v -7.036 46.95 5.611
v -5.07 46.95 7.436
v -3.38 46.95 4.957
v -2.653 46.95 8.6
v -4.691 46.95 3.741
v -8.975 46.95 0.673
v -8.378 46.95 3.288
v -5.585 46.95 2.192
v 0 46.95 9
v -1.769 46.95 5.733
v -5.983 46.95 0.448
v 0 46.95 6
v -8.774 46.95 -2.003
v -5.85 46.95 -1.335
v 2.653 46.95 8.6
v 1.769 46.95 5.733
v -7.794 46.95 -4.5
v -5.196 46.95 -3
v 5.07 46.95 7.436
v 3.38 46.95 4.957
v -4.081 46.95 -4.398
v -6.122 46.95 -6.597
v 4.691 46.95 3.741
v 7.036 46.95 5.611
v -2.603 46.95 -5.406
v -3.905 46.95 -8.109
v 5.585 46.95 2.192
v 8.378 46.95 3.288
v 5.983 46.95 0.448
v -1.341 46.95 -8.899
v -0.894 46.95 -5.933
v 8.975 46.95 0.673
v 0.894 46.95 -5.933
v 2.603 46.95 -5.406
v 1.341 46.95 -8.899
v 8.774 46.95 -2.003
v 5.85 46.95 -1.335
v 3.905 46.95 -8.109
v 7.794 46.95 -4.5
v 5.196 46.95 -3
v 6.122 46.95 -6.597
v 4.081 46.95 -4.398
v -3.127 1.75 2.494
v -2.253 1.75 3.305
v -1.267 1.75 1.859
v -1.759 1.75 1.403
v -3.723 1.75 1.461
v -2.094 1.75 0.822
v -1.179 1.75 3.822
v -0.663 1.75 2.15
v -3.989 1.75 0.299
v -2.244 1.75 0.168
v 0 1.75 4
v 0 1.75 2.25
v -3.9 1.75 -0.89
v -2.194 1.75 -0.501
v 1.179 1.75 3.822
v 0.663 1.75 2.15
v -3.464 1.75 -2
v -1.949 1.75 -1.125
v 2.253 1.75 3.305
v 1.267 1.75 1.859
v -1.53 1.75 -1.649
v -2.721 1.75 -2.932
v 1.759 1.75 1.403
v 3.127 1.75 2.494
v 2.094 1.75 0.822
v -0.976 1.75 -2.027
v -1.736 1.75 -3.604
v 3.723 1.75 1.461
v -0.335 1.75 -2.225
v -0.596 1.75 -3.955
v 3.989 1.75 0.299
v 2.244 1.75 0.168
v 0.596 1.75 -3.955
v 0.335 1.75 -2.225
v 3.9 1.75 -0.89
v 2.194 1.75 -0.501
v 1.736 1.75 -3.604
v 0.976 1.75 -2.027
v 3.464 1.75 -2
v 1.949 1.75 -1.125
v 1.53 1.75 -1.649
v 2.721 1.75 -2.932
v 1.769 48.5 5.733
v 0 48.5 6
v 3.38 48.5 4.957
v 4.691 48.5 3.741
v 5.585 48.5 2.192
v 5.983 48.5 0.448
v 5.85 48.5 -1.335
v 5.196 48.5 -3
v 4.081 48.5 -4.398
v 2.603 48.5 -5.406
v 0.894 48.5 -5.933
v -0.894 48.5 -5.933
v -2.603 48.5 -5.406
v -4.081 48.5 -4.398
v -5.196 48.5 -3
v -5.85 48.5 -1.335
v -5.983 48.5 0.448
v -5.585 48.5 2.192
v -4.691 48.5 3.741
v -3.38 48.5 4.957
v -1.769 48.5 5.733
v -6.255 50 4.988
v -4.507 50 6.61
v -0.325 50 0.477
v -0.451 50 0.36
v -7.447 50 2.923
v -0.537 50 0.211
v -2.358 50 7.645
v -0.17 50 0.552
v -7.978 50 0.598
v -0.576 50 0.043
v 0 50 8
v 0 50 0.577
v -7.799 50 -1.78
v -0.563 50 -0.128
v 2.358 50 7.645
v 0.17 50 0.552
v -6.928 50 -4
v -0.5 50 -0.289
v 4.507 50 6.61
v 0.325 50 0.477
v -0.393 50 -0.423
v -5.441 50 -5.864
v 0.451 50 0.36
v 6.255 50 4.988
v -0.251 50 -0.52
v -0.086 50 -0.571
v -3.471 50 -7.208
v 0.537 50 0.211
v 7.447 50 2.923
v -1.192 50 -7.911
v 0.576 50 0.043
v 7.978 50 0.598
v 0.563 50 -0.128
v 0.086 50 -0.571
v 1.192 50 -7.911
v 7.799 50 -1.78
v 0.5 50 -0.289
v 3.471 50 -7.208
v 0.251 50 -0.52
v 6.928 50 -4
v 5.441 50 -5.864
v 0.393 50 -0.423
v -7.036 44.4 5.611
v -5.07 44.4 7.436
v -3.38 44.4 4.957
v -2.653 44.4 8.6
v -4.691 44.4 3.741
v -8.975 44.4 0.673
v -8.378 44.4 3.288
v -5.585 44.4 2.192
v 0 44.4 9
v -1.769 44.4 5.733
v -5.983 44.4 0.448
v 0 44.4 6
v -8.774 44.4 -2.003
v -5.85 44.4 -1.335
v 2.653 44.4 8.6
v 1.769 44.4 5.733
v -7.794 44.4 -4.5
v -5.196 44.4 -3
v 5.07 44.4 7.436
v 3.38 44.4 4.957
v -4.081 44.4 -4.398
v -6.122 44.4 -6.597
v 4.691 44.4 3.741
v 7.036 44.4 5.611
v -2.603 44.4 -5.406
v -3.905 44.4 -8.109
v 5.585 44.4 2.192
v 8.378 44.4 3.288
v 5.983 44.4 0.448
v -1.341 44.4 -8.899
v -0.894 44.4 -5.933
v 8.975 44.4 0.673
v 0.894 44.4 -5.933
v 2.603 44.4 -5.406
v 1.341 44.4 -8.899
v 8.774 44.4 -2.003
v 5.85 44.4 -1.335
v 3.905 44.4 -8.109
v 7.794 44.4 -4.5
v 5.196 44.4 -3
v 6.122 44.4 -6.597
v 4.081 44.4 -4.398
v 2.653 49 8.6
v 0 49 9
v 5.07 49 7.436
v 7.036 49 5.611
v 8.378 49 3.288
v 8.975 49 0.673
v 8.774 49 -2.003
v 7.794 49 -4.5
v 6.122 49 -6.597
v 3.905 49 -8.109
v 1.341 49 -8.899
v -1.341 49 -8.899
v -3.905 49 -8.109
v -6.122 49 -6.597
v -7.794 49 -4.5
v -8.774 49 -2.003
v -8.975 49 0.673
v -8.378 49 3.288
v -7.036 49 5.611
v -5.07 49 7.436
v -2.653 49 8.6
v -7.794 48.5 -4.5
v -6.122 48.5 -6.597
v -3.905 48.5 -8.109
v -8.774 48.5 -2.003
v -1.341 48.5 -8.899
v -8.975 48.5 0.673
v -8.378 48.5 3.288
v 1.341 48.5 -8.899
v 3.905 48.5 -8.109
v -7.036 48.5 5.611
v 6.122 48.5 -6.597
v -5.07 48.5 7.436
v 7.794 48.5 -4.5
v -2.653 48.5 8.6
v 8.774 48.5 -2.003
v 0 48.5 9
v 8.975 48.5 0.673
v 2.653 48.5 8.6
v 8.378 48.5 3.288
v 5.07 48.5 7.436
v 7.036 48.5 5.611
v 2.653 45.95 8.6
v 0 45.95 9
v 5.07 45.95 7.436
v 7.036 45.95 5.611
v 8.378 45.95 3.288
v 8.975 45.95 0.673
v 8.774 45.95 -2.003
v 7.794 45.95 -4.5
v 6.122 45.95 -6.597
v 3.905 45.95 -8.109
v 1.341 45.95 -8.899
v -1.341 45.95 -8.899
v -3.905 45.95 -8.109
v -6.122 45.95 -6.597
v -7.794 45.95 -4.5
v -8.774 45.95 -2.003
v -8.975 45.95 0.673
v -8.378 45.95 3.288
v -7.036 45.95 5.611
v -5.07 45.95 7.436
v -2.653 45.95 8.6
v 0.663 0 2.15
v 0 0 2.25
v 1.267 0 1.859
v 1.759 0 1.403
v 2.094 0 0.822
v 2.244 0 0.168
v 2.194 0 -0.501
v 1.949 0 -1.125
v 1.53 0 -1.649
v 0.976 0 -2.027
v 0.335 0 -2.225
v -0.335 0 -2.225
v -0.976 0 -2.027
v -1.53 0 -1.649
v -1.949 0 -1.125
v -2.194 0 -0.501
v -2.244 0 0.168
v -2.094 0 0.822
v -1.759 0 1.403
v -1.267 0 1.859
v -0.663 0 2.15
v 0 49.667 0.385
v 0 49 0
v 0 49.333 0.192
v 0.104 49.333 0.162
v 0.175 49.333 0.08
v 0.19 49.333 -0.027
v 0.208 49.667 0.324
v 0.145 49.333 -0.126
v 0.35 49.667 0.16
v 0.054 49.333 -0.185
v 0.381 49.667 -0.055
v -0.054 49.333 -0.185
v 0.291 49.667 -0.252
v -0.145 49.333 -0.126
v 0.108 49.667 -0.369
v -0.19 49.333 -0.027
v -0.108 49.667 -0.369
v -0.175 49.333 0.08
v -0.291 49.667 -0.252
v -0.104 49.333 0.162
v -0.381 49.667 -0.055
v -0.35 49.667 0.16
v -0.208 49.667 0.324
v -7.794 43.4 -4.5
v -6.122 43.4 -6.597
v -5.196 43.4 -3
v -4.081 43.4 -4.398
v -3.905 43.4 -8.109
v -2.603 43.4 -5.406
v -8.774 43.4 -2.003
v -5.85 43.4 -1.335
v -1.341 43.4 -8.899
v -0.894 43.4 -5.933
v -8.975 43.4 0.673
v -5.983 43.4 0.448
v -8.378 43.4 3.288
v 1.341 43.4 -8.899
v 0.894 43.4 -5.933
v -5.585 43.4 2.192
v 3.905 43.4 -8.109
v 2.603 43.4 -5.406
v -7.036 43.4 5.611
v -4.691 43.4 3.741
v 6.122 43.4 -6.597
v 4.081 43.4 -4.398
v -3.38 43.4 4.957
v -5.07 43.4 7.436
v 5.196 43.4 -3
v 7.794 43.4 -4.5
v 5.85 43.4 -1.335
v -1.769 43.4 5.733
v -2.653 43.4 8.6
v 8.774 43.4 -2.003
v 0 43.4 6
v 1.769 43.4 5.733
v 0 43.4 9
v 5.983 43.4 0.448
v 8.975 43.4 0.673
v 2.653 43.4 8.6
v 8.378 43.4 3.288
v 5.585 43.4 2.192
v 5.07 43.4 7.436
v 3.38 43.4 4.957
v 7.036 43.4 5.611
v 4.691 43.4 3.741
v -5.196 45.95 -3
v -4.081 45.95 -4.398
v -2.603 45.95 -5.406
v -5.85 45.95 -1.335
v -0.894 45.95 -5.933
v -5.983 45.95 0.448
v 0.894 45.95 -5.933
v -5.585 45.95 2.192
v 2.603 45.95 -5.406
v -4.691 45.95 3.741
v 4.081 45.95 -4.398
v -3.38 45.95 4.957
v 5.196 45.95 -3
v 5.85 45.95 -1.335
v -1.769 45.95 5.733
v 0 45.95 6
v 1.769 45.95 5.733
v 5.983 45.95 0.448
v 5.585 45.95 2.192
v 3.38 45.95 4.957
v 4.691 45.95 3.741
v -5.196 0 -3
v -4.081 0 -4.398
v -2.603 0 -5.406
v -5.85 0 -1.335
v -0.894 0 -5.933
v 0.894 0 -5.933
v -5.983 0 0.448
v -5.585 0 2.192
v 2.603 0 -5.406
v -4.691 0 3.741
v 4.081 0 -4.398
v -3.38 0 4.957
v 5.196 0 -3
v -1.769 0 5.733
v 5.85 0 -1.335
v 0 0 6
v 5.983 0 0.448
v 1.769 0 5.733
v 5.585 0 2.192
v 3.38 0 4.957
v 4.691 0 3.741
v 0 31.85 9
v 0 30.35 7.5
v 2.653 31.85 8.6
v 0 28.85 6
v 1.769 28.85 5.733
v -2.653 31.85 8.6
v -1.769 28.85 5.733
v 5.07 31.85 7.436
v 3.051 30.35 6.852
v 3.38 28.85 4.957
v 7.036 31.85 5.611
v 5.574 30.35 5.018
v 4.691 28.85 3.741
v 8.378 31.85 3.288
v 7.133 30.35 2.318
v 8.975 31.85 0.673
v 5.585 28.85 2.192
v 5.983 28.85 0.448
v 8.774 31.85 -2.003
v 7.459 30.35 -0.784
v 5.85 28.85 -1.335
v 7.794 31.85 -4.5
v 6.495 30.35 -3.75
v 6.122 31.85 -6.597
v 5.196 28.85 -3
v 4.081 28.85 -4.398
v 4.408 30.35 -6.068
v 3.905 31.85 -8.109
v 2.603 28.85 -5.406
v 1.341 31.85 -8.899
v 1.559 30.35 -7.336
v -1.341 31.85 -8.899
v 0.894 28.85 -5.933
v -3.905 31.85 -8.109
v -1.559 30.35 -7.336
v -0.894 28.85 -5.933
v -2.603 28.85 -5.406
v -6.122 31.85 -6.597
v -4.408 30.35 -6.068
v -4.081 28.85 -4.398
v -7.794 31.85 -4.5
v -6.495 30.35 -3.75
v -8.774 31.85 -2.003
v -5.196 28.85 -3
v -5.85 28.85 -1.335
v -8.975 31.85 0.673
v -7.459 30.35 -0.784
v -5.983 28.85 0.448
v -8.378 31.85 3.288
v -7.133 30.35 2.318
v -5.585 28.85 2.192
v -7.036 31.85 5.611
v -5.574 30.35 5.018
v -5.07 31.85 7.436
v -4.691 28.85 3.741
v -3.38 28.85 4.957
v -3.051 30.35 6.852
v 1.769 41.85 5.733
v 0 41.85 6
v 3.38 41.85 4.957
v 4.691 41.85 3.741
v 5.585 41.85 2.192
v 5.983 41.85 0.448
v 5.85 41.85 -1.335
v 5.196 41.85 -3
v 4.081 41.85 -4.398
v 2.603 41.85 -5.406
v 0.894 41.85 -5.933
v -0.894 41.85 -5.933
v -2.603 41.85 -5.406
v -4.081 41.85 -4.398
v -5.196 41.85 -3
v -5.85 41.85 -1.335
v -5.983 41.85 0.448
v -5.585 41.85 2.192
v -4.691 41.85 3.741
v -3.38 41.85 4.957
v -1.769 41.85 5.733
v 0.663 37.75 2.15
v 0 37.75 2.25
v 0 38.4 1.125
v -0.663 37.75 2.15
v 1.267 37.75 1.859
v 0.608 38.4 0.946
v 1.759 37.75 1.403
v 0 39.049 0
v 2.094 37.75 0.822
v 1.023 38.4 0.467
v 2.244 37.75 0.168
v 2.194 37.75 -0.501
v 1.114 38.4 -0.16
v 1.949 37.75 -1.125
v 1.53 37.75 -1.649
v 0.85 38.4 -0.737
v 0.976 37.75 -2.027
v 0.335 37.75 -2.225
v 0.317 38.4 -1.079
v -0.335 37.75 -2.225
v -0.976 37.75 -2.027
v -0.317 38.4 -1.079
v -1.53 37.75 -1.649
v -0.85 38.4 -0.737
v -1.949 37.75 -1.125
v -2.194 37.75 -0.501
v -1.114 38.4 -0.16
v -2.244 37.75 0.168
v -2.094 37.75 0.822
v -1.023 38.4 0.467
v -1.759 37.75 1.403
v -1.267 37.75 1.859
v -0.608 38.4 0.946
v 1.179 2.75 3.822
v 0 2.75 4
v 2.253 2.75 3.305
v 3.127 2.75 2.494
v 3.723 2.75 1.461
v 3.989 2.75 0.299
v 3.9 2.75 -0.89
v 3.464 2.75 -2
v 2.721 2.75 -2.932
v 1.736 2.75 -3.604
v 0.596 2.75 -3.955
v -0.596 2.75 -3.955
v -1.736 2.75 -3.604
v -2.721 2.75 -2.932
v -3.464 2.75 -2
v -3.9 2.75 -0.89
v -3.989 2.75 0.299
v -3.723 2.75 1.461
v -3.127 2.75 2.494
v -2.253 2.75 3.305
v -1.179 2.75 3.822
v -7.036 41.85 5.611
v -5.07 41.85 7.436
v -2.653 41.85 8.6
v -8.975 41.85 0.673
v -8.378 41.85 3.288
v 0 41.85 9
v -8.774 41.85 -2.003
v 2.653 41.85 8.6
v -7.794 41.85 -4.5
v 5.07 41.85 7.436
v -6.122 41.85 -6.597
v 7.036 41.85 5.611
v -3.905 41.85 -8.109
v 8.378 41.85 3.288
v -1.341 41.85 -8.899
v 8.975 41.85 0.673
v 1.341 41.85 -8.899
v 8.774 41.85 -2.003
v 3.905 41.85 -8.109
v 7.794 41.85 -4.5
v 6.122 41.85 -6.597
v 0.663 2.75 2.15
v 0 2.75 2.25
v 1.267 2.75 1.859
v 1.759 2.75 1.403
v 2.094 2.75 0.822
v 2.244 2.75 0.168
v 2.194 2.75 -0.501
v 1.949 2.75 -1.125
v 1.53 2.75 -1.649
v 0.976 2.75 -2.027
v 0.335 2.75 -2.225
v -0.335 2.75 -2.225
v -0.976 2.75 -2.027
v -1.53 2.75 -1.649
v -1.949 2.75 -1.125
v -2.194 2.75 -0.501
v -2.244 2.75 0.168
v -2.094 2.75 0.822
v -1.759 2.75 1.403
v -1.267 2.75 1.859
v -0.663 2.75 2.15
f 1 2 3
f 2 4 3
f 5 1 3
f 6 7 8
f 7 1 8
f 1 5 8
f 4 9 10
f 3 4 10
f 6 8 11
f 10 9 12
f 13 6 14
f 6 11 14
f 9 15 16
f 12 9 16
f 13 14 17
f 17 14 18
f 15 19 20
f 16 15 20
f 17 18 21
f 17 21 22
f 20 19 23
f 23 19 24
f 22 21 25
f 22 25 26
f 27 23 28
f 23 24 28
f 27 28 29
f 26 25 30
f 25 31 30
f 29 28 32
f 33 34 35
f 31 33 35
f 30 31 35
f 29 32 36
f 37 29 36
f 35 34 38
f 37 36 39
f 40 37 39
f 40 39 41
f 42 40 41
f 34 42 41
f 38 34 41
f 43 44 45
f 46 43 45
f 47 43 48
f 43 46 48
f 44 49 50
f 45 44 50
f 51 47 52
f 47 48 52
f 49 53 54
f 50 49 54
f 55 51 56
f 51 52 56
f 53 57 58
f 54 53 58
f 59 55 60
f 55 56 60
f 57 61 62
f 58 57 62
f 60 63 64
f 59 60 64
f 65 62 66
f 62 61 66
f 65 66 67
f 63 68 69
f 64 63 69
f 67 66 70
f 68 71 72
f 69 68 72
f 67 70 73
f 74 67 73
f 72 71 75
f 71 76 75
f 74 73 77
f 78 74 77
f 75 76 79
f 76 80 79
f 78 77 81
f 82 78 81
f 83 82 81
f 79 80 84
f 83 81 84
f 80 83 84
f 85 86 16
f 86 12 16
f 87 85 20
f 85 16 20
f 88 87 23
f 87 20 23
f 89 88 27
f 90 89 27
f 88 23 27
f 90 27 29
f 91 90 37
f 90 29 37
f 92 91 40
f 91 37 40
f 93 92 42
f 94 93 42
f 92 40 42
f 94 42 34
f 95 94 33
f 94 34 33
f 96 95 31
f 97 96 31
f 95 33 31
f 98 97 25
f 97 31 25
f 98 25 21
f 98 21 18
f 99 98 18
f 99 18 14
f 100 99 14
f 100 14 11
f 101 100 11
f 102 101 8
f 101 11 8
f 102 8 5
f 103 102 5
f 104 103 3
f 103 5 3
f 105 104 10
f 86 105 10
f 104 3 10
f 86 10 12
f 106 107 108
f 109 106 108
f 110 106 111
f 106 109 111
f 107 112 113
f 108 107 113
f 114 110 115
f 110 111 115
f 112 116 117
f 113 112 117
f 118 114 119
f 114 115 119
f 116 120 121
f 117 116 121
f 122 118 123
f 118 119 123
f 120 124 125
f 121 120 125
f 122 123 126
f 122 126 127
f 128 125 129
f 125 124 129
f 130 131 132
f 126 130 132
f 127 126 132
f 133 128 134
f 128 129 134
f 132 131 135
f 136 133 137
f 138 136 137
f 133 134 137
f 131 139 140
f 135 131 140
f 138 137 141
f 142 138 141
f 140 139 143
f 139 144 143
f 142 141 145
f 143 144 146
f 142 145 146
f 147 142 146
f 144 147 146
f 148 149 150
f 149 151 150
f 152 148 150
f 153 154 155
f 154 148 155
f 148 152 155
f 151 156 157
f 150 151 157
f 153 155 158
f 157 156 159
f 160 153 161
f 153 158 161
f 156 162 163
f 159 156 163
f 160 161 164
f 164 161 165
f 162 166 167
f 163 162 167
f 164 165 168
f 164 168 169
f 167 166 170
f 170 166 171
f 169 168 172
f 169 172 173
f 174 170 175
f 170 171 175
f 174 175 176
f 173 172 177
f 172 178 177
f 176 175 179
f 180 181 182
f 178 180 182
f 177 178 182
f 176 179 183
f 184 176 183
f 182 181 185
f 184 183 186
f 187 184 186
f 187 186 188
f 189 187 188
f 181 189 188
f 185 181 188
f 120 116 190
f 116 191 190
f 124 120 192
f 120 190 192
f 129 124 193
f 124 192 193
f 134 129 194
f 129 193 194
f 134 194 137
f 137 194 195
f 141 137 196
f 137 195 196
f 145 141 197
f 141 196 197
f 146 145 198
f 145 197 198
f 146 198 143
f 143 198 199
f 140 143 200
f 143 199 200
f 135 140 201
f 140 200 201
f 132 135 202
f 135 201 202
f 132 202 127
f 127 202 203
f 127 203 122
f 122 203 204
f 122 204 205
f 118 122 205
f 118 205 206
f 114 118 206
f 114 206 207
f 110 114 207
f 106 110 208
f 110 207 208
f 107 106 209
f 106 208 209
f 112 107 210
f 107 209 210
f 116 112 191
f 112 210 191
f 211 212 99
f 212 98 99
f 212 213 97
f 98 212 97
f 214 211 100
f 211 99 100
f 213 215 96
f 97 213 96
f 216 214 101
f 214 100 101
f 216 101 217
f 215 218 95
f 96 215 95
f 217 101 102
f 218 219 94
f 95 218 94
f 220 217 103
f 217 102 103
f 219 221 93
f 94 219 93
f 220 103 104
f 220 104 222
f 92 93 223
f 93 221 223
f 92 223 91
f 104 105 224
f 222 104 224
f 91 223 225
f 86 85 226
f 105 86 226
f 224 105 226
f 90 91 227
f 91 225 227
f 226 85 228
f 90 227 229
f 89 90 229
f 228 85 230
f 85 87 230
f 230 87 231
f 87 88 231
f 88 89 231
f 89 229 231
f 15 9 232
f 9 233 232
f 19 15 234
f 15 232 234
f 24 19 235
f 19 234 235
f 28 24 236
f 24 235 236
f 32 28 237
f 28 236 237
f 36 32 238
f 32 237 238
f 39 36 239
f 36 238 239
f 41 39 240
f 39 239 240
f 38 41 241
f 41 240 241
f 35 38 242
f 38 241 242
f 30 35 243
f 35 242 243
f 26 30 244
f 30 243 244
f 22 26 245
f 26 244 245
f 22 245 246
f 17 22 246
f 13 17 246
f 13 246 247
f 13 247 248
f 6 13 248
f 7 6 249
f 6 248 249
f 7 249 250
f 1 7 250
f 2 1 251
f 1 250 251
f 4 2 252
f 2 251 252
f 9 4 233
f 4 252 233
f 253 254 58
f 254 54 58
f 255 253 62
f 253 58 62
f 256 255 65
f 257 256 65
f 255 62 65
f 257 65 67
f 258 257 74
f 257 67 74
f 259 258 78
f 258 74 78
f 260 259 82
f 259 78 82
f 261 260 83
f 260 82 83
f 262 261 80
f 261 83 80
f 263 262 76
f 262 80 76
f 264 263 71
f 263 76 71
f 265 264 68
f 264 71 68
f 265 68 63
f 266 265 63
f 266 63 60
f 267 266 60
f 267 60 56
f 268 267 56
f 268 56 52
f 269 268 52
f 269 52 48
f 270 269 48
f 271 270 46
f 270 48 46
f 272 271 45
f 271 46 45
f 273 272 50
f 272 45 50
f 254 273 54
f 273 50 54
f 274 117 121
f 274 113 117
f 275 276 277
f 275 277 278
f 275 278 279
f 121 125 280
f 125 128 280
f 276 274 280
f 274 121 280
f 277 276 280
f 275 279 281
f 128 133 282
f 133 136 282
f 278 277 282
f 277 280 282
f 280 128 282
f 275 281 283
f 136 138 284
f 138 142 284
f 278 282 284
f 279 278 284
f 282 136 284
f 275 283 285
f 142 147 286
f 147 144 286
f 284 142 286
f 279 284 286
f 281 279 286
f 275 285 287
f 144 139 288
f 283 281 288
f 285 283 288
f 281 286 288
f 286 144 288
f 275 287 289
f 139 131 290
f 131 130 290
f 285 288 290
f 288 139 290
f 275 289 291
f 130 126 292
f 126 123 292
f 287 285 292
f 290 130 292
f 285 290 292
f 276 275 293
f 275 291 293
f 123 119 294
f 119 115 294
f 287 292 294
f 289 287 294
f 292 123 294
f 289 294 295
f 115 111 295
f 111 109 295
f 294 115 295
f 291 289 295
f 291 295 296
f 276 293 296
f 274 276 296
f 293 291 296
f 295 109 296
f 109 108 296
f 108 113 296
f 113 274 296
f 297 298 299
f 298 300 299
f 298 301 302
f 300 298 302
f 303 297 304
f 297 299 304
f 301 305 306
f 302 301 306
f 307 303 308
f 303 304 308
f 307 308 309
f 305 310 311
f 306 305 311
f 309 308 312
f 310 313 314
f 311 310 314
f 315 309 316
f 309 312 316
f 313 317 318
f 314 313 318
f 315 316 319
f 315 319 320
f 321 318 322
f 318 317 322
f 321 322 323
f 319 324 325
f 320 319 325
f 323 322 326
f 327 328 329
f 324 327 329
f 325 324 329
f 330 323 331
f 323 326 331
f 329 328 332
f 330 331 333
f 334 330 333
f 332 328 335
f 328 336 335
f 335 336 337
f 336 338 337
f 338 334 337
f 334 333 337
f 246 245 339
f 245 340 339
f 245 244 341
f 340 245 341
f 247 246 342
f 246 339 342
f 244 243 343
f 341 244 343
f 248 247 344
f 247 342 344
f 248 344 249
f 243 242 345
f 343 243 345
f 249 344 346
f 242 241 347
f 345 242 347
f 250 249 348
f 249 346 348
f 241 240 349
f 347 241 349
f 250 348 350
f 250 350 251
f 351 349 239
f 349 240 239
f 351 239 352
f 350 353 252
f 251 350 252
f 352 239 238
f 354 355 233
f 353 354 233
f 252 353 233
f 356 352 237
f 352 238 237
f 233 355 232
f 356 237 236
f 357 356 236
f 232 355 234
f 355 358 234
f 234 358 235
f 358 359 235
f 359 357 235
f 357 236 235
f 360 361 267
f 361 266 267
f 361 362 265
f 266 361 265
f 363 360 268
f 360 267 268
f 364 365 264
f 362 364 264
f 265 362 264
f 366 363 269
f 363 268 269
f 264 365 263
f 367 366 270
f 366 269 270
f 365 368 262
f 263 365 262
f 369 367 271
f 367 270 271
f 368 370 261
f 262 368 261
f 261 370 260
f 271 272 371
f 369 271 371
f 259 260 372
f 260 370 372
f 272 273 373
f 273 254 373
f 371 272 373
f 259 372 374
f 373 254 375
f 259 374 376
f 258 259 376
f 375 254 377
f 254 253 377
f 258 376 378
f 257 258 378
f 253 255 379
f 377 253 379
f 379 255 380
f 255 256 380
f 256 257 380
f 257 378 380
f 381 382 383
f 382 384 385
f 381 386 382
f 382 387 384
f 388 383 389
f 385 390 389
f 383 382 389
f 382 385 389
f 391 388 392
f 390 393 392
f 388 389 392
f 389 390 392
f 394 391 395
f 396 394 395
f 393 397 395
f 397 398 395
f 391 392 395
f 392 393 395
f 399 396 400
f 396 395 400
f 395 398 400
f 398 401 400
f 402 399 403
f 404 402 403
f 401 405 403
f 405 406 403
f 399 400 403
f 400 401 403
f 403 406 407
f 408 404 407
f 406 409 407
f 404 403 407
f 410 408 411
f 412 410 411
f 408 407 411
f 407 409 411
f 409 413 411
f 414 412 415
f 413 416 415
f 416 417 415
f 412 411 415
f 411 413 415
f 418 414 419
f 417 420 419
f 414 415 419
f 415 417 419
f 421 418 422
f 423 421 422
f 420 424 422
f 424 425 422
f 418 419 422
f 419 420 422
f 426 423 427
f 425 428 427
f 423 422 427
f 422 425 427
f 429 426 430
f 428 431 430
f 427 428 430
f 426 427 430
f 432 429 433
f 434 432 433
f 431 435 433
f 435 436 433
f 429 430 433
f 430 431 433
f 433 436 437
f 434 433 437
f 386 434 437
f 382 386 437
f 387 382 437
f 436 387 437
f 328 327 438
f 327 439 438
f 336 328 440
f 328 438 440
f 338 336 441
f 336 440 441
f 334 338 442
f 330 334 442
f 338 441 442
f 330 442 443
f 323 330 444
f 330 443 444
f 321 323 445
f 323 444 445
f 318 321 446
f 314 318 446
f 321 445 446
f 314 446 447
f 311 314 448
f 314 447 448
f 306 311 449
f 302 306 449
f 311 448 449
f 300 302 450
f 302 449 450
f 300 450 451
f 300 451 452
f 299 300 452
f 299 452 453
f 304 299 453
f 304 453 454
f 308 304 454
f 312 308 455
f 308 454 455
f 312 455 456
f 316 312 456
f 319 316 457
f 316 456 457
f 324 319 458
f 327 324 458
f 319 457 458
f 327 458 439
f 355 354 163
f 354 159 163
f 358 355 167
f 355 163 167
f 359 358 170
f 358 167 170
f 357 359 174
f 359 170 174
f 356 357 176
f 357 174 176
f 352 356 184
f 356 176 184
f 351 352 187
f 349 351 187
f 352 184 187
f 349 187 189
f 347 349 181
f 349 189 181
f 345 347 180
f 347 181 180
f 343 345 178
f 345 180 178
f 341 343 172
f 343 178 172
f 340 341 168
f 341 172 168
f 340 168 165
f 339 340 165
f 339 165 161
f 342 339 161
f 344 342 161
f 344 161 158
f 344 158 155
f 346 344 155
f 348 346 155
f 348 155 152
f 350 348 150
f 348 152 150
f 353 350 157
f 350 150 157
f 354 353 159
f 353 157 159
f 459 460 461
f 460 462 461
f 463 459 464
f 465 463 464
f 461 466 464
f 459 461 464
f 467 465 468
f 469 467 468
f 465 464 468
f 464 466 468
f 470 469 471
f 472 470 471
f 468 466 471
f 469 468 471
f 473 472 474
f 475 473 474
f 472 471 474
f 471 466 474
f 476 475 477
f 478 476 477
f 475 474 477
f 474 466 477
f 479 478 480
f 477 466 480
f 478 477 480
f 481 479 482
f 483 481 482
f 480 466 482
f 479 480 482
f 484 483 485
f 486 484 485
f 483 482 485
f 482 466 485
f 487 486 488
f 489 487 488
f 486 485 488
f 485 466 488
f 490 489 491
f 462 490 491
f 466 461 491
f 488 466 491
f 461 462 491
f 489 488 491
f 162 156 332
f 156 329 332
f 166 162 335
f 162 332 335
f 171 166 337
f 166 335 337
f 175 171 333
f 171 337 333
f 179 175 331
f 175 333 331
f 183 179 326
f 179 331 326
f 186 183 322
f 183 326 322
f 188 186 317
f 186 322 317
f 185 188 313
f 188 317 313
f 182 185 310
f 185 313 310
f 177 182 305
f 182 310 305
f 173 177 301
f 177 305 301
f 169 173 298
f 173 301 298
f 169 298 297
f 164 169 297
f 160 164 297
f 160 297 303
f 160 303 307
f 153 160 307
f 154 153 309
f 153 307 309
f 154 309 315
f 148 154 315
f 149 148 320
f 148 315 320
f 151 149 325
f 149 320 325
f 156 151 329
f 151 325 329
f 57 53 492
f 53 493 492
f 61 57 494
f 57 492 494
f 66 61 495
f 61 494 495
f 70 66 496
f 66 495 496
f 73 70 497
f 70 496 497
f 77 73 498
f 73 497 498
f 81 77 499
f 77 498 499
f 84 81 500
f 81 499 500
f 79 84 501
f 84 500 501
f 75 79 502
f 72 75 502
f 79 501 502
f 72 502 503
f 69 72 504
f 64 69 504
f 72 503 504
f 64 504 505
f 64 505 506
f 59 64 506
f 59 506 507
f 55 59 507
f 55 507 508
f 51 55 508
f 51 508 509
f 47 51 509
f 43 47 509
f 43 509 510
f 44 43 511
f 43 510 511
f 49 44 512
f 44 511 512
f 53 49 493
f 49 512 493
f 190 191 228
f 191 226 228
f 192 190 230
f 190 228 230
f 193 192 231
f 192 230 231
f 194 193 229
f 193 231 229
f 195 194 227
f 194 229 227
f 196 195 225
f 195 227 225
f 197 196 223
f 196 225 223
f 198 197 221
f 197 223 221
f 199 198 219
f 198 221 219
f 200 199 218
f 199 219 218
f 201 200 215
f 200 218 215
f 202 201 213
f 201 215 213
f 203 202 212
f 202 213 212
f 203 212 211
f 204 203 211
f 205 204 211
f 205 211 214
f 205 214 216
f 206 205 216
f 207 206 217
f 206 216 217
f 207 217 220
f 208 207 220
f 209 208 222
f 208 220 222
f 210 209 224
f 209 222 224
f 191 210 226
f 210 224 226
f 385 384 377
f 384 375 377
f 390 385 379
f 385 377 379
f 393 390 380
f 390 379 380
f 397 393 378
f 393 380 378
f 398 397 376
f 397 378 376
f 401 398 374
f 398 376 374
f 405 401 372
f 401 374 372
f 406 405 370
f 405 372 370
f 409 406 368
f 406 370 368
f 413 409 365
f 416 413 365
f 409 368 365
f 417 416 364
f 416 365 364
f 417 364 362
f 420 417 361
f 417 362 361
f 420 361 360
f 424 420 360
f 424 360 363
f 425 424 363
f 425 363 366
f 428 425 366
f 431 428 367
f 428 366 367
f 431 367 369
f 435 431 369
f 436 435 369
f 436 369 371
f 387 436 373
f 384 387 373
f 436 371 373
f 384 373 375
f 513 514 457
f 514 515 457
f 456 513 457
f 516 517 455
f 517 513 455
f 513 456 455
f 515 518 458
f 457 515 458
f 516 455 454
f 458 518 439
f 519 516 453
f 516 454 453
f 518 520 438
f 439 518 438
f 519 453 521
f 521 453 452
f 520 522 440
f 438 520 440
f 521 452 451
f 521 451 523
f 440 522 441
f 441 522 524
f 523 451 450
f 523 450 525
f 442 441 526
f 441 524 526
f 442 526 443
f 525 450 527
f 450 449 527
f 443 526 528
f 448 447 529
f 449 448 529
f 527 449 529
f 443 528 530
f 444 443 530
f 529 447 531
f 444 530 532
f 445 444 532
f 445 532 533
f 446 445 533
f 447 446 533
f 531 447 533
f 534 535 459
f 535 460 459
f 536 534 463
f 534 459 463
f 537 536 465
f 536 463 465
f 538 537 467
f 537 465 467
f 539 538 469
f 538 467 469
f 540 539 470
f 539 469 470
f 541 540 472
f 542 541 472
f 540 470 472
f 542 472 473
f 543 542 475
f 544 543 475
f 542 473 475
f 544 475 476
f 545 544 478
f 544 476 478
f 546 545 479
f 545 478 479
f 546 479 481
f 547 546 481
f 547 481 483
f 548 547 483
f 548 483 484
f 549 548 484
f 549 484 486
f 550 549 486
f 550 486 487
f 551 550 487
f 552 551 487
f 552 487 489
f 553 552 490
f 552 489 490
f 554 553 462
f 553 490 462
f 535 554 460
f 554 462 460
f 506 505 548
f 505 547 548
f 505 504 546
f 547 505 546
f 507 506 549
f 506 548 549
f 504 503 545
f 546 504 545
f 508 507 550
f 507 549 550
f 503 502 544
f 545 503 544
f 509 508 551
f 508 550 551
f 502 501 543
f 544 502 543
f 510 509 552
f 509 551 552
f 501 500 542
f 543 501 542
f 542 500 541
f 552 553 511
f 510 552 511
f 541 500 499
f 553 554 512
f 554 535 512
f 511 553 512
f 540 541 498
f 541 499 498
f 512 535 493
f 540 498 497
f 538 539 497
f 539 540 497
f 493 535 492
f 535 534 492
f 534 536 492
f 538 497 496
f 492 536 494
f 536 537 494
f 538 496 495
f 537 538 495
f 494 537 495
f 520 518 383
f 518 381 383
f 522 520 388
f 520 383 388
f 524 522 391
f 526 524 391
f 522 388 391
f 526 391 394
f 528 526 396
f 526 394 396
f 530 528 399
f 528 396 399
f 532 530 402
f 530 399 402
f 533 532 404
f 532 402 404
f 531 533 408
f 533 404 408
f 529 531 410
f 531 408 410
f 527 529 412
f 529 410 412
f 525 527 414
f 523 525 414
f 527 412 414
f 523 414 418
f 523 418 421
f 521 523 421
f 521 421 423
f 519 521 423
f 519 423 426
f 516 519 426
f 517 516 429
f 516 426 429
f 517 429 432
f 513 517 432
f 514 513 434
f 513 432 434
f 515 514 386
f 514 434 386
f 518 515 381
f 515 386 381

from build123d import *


with BuildPart() as f1:
    # F0 (on Right) → F1 (revolve)
    with BuildSketch(Plane.YZ):
        Polygon((28.85, 6), (0, 6), (0, 2.25), (1.75, 2.25), (1.75, 4), (2.75, 4), (2.75, 2.25), (37.75, 2.25), (39.049038, 0), (49, 0), (50, 0.57735), (50, 8), (49, 9), (48.5, 9), (48.5, 6), (46.95, 6), (46.95, 9), (45.95, 9), (45.95, 6), (44.4, 6), (44.4, 9), (43.4, 9), (43.4, 6), (41.85, 6), (41.85, 9), (31.85, 9), align=None)
    revolve(axis=Axis((0, 25.938479, 0), (0, 1, 0)))


solid = f1.part
